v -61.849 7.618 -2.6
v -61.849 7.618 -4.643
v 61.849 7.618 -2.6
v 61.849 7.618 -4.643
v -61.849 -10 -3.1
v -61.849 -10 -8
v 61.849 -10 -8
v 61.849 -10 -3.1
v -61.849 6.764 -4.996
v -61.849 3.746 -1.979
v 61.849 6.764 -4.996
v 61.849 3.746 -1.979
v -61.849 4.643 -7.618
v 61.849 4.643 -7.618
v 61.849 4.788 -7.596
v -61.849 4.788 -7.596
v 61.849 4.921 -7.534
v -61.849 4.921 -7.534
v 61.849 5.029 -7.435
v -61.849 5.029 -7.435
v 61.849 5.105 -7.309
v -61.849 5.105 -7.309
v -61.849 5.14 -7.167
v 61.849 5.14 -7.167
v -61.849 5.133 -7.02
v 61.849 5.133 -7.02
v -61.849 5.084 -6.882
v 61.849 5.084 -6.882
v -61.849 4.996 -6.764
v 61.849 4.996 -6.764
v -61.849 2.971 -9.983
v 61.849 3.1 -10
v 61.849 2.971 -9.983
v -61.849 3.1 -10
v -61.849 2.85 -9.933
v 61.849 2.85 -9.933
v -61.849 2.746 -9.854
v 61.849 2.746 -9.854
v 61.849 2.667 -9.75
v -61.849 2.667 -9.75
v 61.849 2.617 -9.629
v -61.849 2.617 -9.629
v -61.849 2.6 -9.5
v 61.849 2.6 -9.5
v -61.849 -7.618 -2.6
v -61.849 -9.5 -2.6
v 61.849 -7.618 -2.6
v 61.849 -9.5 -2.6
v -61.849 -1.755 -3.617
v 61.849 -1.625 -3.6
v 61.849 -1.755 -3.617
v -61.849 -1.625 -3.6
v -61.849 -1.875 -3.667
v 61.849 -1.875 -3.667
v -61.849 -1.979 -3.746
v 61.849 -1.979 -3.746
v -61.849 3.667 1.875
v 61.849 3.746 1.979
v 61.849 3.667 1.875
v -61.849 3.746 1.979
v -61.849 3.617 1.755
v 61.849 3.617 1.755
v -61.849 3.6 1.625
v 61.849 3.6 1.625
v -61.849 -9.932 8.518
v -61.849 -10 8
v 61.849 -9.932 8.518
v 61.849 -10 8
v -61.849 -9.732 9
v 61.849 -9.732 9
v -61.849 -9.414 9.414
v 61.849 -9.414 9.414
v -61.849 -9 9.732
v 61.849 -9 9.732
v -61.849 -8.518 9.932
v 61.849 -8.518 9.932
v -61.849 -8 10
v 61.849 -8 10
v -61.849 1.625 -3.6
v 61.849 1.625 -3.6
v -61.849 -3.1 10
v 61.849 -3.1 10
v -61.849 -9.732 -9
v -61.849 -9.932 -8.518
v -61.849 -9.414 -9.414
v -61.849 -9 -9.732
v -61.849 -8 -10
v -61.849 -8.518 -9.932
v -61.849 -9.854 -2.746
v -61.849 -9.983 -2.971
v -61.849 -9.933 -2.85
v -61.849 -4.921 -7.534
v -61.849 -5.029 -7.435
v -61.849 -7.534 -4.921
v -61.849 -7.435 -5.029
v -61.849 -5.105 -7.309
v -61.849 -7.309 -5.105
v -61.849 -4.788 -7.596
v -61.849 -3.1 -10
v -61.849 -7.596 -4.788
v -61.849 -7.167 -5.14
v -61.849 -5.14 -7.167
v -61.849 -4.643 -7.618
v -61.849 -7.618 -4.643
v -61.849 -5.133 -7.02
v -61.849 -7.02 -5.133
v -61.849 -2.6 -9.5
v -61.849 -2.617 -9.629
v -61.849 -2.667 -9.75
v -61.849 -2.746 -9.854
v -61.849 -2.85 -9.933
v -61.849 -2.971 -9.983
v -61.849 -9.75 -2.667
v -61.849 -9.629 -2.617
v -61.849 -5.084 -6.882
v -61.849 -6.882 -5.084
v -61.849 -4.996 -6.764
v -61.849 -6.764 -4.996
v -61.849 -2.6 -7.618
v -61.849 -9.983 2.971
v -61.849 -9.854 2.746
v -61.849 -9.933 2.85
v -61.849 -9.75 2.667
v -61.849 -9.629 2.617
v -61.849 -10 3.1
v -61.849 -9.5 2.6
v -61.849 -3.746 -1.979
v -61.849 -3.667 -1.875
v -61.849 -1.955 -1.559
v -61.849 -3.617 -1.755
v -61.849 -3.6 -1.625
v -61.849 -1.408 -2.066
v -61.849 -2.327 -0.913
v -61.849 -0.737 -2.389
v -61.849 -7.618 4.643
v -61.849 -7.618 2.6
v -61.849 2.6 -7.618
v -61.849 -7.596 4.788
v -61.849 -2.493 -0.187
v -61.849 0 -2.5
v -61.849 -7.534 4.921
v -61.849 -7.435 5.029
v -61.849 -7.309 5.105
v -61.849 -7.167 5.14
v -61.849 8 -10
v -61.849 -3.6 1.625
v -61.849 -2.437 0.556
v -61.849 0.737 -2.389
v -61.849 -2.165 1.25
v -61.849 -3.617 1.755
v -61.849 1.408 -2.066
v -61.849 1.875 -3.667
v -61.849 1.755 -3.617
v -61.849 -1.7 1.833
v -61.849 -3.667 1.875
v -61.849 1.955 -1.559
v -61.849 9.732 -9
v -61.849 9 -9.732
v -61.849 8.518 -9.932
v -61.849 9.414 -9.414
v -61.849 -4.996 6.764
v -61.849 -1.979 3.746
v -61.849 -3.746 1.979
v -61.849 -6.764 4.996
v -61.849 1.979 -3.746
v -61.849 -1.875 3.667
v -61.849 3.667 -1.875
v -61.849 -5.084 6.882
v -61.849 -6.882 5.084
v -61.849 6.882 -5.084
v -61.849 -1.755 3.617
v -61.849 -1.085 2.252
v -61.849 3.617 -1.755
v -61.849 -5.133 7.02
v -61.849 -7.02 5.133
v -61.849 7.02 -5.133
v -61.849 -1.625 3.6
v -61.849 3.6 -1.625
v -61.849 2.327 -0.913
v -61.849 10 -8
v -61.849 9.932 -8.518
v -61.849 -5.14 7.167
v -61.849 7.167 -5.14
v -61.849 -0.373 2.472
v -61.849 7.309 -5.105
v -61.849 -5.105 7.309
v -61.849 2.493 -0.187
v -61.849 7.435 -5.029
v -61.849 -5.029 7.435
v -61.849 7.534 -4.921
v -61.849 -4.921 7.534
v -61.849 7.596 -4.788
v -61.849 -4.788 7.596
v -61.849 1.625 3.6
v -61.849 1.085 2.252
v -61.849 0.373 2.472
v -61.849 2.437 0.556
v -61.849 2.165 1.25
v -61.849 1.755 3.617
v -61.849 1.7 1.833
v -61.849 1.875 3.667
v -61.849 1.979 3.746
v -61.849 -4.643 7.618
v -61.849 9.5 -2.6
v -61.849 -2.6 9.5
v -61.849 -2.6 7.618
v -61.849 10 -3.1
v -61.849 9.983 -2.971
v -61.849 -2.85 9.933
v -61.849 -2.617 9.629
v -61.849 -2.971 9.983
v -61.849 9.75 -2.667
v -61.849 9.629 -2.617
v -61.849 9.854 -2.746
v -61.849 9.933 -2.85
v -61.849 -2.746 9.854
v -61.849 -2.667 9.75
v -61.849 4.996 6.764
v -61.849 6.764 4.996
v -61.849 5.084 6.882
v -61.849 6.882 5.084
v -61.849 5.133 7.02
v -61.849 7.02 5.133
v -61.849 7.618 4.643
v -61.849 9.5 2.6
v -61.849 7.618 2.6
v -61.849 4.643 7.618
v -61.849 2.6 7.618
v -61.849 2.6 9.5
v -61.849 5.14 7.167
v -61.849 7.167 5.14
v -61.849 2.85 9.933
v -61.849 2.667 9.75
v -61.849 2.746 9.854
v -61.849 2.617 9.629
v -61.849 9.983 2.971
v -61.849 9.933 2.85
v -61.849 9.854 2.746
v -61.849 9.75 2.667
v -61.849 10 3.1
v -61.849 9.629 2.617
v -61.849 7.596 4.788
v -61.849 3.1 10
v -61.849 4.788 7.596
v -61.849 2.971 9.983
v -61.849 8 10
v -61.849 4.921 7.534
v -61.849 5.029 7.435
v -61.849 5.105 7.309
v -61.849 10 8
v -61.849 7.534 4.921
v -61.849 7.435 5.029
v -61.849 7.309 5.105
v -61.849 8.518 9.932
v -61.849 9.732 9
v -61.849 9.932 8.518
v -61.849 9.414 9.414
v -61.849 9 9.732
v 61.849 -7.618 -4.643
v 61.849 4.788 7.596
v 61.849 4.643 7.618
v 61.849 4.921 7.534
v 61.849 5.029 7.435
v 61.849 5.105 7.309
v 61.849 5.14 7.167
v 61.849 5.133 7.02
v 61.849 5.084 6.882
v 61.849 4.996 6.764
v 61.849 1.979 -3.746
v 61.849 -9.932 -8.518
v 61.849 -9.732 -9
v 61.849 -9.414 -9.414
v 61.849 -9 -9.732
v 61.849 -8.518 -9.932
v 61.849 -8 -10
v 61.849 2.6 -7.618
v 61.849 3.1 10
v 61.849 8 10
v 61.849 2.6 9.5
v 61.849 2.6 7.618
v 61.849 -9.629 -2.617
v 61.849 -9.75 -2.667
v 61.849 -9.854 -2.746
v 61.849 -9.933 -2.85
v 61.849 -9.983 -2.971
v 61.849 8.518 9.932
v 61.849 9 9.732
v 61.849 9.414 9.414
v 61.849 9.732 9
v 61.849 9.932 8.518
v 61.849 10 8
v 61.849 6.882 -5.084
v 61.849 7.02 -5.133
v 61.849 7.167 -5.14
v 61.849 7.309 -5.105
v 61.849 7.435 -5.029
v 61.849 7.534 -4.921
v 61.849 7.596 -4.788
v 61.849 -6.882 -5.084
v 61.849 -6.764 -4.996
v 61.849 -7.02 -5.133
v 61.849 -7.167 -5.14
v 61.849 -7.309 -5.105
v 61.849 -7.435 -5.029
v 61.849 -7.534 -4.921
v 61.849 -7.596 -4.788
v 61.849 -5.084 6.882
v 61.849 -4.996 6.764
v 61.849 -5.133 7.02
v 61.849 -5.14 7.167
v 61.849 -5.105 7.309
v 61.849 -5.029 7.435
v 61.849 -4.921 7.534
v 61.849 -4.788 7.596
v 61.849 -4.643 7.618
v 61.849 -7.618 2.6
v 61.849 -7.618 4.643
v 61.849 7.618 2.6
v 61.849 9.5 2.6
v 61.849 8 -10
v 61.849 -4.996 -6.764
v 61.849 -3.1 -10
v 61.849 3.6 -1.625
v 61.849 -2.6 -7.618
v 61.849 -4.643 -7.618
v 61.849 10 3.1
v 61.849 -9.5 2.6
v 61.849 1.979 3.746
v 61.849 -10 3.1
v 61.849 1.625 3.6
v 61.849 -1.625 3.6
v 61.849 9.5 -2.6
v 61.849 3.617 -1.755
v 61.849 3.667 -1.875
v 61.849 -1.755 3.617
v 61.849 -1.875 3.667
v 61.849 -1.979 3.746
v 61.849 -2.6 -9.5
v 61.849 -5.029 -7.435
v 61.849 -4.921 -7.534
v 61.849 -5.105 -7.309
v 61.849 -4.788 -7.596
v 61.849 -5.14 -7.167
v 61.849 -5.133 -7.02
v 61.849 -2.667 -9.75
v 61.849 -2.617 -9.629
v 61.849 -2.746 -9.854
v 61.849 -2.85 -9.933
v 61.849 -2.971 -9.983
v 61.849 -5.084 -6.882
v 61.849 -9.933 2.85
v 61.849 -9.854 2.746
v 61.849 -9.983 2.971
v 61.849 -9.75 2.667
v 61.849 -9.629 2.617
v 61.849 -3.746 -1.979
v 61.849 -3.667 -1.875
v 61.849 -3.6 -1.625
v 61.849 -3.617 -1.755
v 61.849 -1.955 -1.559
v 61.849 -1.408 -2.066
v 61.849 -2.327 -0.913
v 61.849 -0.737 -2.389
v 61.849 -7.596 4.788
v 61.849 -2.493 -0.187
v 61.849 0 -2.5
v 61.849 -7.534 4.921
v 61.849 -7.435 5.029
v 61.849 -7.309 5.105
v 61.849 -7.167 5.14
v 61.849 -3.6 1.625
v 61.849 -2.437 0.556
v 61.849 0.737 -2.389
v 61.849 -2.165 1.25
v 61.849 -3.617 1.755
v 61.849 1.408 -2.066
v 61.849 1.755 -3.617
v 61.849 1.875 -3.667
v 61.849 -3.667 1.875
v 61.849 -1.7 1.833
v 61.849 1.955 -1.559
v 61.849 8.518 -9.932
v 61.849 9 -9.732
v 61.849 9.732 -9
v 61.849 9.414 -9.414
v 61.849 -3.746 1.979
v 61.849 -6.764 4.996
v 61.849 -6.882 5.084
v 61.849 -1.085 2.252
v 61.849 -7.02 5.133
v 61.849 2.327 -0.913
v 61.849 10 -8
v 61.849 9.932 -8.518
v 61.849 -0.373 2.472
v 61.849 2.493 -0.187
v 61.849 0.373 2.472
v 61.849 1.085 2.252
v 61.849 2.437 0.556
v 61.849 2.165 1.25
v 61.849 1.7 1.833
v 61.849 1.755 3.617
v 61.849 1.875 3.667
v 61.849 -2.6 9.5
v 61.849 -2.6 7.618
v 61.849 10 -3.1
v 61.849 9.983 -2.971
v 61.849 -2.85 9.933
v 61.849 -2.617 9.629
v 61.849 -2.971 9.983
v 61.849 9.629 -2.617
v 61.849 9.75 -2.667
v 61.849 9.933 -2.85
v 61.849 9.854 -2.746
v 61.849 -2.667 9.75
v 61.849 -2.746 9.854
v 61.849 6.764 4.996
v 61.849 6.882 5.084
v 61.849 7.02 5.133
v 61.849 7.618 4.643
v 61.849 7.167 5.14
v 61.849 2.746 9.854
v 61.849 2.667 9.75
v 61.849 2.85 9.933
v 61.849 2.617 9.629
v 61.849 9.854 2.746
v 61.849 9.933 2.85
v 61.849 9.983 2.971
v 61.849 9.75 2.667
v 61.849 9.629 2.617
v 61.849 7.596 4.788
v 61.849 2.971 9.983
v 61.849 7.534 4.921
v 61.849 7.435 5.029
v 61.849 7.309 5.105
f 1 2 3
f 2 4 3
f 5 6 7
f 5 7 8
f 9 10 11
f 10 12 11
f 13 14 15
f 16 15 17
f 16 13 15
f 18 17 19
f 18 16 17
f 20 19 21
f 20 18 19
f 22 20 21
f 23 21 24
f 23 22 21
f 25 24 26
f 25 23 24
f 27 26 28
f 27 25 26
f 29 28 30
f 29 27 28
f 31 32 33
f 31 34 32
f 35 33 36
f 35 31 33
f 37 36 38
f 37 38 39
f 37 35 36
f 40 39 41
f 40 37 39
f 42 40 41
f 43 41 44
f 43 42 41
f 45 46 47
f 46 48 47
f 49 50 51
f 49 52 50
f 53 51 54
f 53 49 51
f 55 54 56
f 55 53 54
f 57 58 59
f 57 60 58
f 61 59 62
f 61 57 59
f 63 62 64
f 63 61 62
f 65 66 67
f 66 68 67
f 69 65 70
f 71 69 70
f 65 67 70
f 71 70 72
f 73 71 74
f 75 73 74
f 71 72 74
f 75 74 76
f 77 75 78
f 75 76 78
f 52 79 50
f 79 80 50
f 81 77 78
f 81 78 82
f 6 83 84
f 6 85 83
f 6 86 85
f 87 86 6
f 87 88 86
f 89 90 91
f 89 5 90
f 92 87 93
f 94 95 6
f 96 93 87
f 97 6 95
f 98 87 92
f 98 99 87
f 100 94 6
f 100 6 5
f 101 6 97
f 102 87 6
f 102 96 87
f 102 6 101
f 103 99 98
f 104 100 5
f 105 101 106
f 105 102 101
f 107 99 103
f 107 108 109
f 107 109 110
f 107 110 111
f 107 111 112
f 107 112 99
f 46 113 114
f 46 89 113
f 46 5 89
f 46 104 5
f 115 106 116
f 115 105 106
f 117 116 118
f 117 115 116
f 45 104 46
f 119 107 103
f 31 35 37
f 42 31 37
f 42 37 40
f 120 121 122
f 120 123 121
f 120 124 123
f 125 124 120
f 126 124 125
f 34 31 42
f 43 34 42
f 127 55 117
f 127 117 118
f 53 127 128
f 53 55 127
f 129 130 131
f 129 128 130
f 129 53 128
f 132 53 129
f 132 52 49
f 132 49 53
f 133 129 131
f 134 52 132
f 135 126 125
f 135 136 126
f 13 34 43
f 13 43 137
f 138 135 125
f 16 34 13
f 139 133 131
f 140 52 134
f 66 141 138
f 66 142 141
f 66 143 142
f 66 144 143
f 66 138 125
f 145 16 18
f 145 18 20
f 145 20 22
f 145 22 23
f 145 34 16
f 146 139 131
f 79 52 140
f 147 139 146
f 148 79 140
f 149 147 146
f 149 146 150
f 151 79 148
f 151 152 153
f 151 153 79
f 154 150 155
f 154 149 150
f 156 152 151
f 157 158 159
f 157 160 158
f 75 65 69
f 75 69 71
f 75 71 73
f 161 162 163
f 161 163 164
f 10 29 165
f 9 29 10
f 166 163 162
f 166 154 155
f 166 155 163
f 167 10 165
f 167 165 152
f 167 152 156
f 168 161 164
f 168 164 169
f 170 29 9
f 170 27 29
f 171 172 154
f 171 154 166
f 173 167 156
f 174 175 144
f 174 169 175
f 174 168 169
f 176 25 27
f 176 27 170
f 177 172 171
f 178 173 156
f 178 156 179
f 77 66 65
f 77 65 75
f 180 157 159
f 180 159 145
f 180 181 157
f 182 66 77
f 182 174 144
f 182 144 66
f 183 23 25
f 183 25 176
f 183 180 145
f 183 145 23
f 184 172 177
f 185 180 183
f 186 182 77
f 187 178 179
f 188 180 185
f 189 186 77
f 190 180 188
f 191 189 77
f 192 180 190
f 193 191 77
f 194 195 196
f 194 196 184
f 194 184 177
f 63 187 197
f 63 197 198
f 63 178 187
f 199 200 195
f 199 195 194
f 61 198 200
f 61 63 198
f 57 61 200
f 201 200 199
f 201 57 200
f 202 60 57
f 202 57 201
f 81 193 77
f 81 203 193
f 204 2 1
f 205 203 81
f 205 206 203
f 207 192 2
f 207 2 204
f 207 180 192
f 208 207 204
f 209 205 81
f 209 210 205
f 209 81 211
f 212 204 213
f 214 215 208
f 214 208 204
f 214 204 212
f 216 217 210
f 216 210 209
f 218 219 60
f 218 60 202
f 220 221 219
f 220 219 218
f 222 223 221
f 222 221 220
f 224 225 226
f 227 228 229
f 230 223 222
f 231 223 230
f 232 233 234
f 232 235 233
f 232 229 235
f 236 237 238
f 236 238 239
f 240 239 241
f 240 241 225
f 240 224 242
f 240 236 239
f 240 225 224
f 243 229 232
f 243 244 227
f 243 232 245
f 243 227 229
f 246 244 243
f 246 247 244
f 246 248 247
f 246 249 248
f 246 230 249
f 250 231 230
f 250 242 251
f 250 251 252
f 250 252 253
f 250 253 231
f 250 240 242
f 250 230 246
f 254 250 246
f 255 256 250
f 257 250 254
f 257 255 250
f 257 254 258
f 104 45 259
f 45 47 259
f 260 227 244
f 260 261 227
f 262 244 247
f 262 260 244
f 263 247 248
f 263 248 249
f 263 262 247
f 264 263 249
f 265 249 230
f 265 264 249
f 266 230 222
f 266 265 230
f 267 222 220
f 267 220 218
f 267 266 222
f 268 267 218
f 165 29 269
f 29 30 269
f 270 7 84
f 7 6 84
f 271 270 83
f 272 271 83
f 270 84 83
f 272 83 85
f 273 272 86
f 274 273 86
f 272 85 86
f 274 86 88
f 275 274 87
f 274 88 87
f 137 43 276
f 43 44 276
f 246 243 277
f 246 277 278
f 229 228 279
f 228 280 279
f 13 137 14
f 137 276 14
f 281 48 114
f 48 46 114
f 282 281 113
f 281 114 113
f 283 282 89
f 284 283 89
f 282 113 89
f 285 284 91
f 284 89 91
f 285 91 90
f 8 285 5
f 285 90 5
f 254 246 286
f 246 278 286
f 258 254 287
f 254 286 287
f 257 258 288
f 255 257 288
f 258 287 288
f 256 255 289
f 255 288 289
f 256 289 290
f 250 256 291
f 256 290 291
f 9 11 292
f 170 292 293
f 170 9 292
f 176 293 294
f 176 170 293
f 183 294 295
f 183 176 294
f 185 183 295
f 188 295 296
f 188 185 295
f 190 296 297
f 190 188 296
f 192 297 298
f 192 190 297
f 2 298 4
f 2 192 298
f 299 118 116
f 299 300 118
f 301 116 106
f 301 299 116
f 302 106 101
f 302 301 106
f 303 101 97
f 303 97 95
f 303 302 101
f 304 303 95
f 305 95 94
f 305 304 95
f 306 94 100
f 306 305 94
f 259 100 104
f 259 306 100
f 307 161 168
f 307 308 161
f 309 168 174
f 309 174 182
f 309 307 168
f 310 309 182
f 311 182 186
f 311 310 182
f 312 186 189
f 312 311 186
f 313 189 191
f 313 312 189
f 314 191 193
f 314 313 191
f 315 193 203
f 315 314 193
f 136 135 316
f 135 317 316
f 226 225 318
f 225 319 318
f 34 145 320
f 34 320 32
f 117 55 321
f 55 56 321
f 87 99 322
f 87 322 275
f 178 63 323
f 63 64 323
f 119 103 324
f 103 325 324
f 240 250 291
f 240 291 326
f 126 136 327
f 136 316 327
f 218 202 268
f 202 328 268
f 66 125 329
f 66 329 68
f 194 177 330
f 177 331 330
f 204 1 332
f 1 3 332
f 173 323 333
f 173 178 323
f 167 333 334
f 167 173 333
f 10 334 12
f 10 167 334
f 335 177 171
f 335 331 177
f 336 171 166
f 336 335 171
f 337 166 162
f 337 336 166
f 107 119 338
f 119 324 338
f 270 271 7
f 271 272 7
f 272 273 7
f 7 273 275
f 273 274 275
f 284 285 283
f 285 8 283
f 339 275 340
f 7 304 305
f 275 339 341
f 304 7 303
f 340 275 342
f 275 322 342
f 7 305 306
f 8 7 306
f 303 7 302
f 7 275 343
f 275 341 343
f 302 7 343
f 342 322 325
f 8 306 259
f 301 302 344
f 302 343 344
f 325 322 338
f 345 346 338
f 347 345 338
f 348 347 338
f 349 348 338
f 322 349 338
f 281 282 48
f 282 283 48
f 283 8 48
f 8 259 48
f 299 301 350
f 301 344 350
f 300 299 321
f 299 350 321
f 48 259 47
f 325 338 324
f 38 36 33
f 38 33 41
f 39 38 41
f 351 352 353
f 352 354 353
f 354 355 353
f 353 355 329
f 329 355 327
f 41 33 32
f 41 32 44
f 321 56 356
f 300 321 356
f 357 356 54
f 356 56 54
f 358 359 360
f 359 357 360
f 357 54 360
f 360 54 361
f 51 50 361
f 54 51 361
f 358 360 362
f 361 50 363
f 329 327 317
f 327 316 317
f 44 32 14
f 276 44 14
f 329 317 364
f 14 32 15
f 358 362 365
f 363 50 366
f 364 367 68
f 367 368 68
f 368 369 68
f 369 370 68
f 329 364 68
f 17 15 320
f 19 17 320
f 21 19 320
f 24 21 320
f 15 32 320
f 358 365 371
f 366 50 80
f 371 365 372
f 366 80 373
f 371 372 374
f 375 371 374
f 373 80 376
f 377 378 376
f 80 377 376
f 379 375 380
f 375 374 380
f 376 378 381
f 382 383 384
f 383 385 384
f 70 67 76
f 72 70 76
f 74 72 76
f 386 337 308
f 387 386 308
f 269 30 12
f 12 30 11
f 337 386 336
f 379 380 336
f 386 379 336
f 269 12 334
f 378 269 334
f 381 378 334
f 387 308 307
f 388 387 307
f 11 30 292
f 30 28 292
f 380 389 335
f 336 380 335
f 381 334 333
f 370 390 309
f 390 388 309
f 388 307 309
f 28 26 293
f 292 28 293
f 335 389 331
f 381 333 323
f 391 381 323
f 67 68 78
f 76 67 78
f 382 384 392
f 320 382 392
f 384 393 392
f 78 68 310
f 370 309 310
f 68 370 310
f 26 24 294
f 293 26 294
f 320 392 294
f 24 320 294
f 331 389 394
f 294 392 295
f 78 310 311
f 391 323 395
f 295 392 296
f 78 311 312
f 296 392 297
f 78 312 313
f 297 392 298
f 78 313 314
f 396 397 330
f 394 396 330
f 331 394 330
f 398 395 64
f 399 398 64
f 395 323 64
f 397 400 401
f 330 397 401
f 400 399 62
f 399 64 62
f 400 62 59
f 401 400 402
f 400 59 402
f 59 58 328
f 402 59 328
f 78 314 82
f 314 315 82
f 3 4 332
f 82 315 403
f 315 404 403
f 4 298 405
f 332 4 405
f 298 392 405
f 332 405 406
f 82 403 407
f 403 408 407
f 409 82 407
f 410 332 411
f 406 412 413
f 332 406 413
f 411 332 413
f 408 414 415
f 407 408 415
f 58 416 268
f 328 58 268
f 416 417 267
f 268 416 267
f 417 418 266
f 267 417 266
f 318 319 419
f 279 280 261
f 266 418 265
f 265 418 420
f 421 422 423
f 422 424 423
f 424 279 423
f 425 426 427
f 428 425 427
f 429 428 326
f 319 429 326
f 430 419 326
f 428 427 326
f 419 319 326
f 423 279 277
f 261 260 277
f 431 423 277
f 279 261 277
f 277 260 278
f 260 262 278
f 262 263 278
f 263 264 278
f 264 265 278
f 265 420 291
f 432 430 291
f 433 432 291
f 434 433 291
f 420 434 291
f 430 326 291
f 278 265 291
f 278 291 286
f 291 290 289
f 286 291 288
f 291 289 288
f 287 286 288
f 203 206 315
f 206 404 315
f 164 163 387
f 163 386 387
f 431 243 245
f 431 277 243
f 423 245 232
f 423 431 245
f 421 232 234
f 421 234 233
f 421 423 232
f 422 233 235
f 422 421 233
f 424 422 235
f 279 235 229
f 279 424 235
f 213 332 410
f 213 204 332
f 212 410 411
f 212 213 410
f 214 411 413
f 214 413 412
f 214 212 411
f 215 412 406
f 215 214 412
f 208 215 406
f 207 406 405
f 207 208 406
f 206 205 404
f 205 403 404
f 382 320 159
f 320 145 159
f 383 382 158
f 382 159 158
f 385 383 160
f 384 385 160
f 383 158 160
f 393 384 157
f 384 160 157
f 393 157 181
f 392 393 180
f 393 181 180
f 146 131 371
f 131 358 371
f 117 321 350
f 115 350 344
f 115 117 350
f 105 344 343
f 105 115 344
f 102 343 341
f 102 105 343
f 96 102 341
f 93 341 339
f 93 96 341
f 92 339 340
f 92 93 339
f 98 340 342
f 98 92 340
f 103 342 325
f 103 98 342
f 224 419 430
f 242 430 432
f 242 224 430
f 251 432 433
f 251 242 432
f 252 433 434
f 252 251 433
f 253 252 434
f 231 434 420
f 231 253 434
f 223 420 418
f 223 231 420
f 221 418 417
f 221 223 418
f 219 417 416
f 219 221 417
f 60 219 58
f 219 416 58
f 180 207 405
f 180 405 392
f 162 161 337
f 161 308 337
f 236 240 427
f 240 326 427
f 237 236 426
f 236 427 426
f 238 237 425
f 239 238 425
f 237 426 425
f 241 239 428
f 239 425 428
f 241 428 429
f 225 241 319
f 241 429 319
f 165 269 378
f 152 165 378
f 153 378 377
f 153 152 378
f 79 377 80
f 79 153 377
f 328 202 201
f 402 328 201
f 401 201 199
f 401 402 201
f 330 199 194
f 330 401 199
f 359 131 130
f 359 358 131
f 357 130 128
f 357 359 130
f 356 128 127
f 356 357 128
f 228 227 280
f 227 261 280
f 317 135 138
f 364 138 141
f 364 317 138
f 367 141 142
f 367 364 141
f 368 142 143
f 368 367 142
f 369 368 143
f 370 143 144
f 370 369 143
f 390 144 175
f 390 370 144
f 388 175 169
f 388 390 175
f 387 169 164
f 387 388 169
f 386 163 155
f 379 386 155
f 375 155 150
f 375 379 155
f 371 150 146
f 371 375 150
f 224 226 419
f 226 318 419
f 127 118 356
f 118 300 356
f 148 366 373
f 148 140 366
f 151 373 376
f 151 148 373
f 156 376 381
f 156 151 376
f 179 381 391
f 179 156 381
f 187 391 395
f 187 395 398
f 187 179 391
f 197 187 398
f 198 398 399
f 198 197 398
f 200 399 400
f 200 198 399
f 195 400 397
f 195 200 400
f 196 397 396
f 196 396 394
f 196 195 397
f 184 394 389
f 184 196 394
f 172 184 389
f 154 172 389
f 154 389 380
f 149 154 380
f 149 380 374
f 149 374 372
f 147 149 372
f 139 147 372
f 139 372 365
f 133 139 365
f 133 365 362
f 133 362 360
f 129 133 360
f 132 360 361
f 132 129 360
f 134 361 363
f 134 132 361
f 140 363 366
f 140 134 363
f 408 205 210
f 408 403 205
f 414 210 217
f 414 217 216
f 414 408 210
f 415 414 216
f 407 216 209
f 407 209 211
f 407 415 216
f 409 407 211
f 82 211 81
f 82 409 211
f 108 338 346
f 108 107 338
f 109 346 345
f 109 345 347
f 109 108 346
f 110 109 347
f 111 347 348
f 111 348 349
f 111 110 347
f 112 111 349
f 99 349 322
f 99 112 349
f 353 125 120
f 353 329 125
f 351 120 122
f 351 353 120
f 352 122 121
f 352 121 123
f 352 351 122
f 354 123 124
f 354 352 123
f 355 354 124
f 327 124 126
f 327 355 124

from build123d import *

# Parameters (mm, degrees)
SKETCH1_R           = 2.5
BOSS_EXTRUDE1_DEPTH = 61.849
FILLET1_R           = 2
FILLET2_R           = 0.5


with BuildPart() as part:
    # Sketch1 → Boss-Extrude1 (new body, symmetric)
    with BuildSketch(Plane(origin=(0, 0, 0), x_dir=(0, 0, -1), z_dir=(1, 0, 0))):
        Polygon((-2.6, 10), (-2.6, 7.617766953), (-5.85, 7.617766953), (-1.832233047, 3.6), (1.832233047, 3.6), (5.85, 7.617766953), (2.6, 7.617766953), (2.6, 10), (10, 10), (10, 2.6), (7.617766953, 2.6), (7.617766953, 5.85), (3.6, 1.832233047), (3.6, -1.832233047), (7.617766953, -5.85), (7.617766953, -2.6), (10, -2.6), (10, -10), (2.6, -10), (2.6, -7.617766953), (5.85, -7.617766953), (1.832233047, -3.6), (-1.832233047, -3.6), (-5.85, -7.617766953), (-2.6, -7.617766953), (-2.6, -10), (-10, -10), (-10, -2.6), (-7.617766953, -2.6), (-7.617766953, -5.85), (-3.6, -1.832233047), (-3.6, 1.832233047), (-7.617766953, 5.85), (-7.617766953, 2.6), (-10, 2.6), (-10, 10), align=None)
        Circle(SKETCH1_R, mode=Mode.SUBTRACT)
    extrude(amount=BOSS_EXTRUDE1_DEPTH, both=True)

    # Fillet1
    fillet1_edges = [part.edges().sort_by_distance(p)[0] for p in [
        (0, 10, 10),
        (0, 10, -10),
        (0, -10, -10),
        (0, -10, 10),
    ]]
    fillet(fillet1_edges, radius=FILLET1_R)

    # Fillet2
    fillet2_edges = [part.edges().sort_by_distance(p)[0] for p in [
        (0, 10, 2.6),
        (0, 7.617766953, 5.85),
        (0, 3.6, 1.832233047),
        (0, 3.6, -1.832233047),
        (0, 7.617766953, -5.85),
        (0, 10, -2.6),
        (0, 2.6, -10),
        (0, 5.85, -7.617766953),
        (0, 1.832233047, -3.6),
        (0, -1.832233047, -3.6),
        (0, -5.85, -7.617766953),
        (0, -2.6, -10),
        (0, -10, -2.6),
        (0, -7.617766953, -5.85),
        (0, -3.6, -1.832233047),
        (0, -3.6, 1.832233047),
        (0, -7.617766953, 5.85),
        (0, -10, 2.6),
        (0, -2.6, 10),
        (0, -5.85, 7.617766953),
        (0, -1.832233047, 3.6),
        (0, 1.832233047, 3.6),
        (0, 5.85, 7.617766953),
        (0, 2.6, 10),
    ]]
    fillet(fillet2_edges, radius=FILLET2_R)


solid = part.part
